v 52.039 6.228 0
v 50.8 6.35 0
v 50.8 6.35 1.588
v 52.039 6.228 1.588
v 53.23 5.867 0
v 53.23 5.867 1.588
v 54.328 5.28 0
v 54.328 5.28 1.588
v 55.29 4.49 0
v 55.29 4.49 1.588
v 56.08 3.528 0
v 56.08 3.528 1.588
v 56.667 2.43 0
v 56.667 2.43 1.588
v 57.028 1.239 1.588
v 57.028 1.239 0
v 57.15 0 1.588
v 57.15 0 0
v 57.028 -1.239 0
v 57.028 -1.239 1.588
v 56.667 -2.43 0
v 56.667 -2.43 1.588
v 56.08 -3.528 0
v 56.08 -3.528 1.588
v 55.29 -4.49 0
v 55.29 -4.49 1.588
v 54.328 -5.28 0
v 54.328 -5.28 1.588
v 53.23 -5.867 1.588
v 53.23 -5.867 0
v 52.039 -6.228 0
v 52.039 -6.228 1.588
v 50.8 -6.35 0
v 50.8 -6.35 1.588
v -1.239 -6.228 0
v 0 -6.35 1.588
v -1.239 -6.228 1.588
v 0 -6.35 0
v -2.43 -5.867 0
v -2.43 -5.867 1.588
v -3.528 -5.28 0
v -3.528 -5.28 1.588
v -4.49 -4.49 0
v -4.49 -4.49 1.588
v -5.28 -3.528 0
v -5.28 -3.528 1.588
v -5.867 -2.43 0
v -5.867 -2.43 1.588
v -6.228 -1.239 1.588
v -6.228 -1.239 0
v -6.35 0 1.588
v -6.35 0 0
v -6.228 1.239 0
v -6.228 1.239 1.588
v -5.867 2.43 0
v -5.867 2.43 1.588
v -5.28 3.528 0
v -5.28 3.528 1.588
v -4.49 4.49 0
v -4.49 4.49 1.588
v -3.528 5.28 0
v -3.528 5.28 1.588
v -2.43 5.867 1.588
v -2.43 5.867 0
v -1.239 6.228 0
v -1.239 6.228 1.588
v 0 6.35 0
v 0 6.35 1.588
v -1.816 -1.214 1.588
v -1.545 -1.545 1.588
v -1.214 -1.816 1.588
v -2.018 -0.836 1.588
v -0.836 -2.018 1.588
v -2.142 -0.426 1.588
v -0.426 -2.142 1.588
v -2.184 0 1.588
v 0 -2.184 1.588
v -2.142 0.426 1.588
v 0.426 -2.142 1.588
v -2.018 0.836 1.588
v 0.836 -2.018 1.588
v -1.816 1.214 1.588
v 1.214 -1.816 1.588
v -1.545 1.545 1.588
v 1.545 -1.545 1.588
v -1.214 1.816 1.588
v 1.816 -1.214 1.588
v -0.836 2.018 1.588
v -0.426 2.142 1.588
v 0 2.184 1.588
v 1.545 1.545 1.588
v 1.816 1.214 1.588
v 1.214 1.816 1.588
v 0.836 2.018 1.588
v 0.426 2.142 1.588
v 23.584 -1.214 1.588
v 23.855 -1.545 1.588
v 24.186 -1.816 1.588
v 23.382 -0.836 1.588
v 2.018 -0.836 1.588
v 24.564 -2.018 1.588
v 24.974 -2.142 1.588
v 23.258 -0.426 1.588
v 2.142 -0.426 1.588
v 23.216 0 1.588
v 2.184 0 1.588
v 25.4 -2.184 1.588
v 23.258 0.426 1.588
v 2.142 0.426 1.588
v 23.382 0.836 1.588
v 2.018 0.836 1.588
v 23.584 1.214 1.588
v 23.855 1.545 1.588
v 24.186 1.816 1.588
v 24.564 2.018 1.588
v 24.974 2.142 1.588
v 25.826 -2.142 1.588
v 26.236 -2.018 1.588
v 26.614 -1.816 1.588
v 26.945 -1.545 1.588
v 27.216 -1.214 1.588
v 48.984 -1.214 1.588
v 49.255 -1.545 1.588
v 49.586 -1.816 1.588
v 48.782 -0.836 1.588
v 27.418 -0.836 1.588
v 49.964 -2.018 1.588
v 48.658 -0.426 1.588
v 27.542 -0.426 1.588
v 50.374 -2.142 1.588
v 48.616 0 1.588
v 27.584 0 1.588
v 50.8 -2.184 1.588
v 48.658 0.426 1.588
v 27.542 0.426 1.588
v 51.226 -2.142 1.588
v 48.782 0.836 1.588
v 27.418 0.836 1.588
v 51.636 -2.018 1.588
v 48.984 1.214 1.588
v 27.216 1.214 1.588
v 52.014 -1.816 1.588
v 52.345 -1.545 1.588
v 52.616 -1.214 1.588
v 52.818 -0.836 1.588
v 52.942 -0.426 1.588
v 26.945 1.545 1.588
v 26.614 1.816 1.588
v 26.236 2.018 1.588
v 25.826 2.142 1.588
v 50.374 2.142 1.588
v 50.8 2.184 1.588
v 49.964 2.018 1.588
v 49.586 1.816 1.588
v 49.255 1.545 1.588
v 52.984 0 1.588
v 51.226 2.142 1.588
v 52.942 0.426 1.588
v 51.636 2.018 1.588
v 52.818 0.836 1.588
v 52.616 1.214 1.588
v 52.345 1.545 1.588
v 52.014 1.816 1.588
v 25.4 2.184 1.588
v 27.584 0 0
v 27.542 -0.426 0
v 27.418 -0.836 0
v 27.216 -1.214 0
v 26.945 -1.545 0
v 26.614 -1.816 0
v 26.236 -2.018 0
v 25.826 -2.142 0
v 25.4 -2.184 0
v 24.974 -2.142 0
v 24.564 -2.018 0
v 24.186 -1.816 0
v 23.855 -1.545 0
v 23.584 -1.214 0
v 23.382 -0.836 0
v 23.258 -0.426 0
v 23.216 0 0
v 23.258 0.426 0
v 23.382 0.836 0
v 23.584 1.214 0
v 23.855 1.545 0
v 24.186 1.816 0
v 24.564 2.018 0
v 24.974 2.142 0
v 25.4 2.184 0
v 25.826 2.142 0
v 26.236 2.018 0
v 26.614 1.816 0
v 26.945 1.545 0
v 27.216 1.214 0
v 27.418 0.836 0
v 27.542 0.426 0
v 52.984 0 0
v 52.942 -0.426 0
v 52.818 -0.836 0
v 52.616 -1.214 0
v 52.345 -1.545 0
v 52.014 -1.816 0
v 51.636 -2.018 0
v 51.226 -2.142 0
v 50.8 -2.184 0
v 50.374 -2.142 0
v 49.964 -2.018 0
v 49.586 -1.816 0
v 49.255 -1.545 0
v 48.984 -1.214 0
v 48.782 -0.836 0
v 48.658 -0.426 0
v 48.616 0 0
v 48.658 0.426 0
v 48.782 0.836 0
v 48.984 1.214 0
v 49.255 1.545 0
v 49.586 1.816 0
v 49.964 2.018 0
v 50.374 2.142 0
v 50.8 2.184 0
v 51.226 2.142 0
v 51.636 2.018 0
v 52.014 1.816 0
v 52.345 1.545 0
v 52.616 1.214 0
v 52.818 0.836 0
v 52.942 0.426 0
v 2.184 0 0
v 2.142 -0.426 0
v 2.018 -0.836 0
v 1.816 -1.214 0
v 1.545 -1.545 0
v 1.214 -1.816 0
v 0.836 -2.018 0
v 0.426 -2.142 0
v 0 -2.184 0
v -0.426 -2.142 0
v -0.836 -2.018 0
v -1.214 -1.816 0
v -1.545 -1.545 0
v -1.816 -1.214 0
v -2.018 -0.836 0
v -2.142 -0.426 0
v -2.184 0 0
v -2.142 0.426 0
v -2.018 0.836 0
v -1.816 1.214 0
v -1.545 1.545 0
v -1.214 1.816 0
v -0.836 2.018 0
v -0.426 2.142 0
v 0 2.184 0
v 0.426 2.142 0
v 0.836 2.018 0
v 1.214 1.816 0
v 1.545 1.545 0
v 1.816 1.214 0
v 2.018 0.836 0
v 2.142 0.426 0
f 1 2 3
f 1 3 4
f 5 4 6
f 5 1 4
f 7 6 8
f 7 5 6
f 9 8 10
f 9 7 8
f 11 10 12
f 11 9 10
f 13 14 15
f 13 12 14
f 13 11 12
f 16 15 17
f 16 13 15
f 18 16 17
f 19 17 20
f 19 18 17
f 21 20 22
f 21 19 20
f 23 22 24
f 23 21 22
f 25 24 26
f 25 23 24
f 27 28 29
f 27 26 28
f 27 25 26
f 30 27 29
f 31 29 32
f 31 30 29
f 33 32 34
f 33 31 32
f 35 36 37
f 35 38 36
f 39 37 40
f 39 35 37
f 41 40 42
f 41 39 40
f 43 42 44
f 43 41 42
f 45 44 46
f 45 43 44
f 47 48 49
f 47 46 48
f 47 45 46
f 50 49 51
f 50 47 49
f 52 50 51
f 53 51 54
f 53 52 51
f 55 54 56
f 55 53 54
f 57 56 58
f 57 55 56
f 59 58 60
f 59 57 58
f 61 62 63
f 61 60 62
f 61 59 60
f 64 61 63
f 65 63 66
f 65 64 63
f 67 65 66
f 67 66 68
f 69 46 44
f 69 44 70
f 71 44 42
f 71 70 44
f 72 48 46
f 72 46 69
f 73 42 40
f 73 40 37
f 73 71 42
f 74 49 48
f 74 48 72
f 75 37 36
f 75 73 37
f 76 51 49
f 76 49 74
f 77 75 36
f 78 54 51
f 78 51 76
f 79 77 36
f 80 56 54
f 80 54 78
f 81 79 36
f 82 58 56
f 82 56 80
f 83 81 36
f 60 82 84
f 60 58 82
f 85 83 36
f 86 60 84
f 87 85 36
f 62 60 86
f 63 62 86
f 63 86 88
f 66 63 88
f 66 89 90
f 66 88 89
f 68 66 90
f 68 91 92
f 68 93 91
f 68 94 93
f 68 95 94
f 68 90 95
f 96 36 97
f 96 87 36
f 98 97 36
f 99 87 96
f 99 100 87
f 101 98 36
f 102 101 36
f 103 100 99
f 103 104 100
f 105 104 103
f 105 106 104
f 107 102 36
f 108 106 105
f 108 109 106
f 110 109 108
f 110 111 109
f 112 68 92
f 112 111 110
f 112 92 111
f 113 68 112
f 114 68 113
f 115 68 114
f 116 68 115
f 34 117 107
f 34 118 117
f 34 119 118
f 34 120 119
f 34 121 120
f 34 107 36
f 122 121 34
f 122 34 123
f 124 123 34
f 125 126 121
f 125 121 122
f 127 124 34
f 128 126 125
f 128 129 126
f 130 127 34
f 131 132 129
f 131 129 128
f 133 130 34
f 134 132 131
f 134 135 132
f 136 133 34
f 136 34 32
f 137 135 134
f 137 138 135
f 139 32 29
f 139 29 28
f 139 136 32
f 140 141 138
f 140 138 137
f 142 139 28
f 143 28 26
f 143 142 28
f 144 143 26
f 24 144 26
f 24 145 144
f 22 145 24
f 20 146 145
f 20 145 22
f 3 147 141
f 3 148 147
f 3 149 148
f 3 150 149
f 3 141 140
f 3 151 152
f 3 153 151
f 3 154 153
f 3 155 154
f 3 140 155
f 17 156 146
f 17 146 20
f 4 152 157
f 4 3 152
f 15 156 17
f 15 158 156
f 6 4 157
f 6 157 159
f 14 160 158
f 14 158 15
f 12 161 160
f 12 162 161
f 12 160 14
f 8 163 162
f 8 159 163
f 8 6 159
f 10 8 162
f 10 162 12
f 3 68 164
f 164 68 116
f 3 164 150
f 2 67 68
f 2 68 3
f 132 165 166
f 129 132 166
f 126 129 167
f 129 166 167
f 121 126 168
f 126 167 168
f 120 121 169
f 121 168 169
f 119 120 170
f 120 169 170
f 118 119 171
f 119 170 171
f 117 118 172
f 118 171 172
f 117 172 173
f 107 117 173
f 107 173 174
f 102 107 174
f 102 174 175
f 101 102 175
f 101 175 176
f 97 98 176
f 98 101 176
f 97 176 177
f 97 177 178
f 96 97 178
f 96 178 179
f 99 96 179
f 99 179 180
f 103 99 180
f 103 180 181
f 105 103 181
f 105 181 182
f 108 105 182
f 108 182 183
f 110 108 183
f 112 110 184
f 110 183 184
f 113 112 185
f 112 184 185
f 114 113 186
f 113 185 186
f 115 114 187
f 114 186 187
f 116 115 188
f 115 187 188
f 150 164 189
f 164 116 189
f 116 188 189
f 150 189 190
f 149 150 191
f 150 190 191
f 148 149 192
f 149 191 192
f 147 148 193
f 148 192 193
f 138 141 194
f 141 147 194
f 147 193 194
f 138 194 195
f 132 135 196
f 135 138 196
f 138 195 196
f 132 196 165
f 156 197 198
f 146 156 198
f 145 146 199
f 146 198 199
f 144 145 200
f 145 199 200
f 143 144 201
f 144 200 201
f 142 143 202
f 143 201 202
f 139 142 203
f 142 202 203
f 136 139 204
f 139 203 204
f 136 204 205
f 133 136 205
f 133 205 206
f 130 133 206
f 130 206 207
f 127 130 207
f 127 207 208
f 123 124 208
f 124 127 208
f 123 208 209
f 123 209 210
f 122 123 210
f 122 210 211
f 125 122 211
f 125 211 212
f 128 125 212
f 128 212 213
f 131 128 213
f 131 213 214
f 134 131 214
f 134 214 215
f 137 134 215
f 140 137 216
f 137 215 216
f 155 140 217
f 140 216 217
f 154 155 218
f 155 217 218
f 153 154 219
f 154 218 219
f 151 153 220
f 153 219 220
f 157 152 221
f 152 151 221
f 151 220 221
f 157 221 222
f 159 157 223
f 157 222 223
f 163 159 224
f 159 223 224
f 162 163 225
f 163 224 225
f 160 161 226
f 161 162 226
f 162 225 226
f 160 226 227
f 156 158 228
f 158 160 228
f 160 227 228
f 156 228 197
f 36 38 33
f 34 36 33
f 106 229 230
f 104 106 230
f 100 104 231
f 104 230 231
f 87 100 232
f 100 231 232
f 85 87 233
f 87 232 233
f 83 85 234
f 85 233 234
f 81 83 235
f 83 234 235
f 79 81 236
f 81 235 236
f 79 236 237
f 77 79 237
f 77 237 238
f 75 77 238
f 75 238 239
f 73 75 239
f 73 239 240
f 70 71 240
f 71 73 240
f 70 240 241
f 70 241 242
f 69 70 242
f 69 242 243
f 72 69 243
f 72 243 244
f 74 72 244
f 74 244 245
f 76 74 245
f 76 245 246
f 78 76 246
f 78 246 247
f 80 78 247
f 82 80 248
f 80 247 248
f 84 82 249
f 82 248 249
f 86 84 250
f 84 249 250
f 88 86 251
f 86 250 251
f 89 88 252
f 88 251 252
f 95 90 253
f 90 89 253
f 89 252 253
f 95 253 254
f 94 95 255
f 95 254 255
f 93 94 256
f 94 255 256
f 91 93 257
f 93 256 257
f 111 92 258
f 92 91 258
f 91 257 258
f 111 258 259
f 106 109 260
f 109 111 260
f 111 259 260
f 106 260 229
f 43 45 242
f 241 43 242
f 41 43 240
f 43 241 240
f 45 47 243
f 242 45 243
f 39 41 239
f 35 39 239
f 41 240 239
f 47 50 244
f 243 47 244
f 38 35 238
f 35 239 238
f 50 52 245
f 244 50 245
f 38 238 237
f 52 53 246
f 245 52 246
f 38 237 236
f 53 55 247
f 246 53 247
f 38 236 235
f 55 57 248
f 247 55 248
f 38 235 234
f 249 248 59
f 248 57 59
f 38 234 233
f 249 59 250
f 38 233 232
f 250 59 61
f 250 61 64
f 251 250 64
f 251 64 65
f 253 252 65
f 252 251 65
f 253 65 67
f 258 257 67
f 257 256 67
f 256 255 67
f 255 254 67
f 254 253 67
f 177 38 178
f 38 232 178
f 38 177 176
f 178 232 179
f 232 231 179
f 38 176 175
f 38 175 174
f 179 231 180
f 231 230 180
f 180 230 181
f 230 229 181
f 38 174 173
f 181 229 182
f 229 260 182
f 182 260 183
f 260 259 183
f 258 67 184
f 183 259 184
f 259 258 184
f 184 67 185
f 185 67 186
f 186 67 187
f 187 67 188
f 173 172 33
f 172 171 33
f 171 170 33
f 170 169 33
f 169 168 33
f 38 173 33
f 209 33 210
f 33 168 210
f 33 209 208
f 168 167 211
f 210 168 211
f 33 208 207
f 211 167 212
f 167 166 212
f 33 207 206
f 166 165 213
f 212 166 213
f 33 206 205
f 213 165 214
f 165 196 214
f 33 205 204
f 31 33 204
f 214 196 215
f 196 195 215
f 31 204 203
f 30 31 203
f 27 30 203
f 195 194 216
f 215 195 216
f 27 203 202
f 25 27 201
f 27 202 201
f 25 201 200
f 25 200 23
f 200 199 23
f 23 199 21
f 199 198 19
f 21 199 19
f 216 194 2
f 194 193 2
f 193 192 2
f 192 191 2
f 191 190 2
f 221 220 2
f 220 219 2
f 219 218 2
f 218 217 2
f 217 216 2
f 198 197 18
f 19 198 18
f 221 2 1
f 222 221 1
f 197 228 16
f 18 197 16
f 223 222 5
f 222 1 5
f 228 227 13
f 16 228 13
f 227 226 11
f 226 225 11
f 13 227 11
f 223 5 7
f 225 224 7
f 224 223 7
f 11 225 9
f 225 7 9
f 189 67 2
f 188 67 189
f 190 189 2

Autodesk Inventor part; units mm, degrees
ref_plane "YZ Plane" through (0, 0, 0) normal (1, 0, 0) x (0, 1, 0)
ref_plane "XZ Plane" through (0, 0, 0) normal (0, 1, 0) x (-1, 0, 0)
ref_plane "XY Plane" through (0, 0, 0) normal (0, 0, 1) x (1, 0, 0)
sketch "Sketch1" plane through (0, 0, 0) normal (0, 0, 1) x (1, 0, 0)
  circle A0 centre (0, 0) radius 2.1844
  circle A1 centre (25.4, 0) radius 2.1844
  circle A2 centre (50.8, 0) radius 2.1844
  line L0 (0, 6.35) -> (50.8, 6.35)
  line L1 (0, -6.35) -> (50.8, -6.35)
  arc A3 (0, 6.35) -> (0, -6.35) centre (0, 0) ccw
  arc A4 (50.8, -6.35) -> (50.8, 6.35) centre (50.8, 0) ccw
  dimension "d0" = 4.3688
  dimension "d1" = 4.3688
  dimension "d2" = 25.4
  dimension "d3" = 4.3688
  dimension "d4" = 25.4
extrude "Extrusion1" add sketch "Sketch1" along normal blind 1.5875
properties part number "gearbox bracket"
